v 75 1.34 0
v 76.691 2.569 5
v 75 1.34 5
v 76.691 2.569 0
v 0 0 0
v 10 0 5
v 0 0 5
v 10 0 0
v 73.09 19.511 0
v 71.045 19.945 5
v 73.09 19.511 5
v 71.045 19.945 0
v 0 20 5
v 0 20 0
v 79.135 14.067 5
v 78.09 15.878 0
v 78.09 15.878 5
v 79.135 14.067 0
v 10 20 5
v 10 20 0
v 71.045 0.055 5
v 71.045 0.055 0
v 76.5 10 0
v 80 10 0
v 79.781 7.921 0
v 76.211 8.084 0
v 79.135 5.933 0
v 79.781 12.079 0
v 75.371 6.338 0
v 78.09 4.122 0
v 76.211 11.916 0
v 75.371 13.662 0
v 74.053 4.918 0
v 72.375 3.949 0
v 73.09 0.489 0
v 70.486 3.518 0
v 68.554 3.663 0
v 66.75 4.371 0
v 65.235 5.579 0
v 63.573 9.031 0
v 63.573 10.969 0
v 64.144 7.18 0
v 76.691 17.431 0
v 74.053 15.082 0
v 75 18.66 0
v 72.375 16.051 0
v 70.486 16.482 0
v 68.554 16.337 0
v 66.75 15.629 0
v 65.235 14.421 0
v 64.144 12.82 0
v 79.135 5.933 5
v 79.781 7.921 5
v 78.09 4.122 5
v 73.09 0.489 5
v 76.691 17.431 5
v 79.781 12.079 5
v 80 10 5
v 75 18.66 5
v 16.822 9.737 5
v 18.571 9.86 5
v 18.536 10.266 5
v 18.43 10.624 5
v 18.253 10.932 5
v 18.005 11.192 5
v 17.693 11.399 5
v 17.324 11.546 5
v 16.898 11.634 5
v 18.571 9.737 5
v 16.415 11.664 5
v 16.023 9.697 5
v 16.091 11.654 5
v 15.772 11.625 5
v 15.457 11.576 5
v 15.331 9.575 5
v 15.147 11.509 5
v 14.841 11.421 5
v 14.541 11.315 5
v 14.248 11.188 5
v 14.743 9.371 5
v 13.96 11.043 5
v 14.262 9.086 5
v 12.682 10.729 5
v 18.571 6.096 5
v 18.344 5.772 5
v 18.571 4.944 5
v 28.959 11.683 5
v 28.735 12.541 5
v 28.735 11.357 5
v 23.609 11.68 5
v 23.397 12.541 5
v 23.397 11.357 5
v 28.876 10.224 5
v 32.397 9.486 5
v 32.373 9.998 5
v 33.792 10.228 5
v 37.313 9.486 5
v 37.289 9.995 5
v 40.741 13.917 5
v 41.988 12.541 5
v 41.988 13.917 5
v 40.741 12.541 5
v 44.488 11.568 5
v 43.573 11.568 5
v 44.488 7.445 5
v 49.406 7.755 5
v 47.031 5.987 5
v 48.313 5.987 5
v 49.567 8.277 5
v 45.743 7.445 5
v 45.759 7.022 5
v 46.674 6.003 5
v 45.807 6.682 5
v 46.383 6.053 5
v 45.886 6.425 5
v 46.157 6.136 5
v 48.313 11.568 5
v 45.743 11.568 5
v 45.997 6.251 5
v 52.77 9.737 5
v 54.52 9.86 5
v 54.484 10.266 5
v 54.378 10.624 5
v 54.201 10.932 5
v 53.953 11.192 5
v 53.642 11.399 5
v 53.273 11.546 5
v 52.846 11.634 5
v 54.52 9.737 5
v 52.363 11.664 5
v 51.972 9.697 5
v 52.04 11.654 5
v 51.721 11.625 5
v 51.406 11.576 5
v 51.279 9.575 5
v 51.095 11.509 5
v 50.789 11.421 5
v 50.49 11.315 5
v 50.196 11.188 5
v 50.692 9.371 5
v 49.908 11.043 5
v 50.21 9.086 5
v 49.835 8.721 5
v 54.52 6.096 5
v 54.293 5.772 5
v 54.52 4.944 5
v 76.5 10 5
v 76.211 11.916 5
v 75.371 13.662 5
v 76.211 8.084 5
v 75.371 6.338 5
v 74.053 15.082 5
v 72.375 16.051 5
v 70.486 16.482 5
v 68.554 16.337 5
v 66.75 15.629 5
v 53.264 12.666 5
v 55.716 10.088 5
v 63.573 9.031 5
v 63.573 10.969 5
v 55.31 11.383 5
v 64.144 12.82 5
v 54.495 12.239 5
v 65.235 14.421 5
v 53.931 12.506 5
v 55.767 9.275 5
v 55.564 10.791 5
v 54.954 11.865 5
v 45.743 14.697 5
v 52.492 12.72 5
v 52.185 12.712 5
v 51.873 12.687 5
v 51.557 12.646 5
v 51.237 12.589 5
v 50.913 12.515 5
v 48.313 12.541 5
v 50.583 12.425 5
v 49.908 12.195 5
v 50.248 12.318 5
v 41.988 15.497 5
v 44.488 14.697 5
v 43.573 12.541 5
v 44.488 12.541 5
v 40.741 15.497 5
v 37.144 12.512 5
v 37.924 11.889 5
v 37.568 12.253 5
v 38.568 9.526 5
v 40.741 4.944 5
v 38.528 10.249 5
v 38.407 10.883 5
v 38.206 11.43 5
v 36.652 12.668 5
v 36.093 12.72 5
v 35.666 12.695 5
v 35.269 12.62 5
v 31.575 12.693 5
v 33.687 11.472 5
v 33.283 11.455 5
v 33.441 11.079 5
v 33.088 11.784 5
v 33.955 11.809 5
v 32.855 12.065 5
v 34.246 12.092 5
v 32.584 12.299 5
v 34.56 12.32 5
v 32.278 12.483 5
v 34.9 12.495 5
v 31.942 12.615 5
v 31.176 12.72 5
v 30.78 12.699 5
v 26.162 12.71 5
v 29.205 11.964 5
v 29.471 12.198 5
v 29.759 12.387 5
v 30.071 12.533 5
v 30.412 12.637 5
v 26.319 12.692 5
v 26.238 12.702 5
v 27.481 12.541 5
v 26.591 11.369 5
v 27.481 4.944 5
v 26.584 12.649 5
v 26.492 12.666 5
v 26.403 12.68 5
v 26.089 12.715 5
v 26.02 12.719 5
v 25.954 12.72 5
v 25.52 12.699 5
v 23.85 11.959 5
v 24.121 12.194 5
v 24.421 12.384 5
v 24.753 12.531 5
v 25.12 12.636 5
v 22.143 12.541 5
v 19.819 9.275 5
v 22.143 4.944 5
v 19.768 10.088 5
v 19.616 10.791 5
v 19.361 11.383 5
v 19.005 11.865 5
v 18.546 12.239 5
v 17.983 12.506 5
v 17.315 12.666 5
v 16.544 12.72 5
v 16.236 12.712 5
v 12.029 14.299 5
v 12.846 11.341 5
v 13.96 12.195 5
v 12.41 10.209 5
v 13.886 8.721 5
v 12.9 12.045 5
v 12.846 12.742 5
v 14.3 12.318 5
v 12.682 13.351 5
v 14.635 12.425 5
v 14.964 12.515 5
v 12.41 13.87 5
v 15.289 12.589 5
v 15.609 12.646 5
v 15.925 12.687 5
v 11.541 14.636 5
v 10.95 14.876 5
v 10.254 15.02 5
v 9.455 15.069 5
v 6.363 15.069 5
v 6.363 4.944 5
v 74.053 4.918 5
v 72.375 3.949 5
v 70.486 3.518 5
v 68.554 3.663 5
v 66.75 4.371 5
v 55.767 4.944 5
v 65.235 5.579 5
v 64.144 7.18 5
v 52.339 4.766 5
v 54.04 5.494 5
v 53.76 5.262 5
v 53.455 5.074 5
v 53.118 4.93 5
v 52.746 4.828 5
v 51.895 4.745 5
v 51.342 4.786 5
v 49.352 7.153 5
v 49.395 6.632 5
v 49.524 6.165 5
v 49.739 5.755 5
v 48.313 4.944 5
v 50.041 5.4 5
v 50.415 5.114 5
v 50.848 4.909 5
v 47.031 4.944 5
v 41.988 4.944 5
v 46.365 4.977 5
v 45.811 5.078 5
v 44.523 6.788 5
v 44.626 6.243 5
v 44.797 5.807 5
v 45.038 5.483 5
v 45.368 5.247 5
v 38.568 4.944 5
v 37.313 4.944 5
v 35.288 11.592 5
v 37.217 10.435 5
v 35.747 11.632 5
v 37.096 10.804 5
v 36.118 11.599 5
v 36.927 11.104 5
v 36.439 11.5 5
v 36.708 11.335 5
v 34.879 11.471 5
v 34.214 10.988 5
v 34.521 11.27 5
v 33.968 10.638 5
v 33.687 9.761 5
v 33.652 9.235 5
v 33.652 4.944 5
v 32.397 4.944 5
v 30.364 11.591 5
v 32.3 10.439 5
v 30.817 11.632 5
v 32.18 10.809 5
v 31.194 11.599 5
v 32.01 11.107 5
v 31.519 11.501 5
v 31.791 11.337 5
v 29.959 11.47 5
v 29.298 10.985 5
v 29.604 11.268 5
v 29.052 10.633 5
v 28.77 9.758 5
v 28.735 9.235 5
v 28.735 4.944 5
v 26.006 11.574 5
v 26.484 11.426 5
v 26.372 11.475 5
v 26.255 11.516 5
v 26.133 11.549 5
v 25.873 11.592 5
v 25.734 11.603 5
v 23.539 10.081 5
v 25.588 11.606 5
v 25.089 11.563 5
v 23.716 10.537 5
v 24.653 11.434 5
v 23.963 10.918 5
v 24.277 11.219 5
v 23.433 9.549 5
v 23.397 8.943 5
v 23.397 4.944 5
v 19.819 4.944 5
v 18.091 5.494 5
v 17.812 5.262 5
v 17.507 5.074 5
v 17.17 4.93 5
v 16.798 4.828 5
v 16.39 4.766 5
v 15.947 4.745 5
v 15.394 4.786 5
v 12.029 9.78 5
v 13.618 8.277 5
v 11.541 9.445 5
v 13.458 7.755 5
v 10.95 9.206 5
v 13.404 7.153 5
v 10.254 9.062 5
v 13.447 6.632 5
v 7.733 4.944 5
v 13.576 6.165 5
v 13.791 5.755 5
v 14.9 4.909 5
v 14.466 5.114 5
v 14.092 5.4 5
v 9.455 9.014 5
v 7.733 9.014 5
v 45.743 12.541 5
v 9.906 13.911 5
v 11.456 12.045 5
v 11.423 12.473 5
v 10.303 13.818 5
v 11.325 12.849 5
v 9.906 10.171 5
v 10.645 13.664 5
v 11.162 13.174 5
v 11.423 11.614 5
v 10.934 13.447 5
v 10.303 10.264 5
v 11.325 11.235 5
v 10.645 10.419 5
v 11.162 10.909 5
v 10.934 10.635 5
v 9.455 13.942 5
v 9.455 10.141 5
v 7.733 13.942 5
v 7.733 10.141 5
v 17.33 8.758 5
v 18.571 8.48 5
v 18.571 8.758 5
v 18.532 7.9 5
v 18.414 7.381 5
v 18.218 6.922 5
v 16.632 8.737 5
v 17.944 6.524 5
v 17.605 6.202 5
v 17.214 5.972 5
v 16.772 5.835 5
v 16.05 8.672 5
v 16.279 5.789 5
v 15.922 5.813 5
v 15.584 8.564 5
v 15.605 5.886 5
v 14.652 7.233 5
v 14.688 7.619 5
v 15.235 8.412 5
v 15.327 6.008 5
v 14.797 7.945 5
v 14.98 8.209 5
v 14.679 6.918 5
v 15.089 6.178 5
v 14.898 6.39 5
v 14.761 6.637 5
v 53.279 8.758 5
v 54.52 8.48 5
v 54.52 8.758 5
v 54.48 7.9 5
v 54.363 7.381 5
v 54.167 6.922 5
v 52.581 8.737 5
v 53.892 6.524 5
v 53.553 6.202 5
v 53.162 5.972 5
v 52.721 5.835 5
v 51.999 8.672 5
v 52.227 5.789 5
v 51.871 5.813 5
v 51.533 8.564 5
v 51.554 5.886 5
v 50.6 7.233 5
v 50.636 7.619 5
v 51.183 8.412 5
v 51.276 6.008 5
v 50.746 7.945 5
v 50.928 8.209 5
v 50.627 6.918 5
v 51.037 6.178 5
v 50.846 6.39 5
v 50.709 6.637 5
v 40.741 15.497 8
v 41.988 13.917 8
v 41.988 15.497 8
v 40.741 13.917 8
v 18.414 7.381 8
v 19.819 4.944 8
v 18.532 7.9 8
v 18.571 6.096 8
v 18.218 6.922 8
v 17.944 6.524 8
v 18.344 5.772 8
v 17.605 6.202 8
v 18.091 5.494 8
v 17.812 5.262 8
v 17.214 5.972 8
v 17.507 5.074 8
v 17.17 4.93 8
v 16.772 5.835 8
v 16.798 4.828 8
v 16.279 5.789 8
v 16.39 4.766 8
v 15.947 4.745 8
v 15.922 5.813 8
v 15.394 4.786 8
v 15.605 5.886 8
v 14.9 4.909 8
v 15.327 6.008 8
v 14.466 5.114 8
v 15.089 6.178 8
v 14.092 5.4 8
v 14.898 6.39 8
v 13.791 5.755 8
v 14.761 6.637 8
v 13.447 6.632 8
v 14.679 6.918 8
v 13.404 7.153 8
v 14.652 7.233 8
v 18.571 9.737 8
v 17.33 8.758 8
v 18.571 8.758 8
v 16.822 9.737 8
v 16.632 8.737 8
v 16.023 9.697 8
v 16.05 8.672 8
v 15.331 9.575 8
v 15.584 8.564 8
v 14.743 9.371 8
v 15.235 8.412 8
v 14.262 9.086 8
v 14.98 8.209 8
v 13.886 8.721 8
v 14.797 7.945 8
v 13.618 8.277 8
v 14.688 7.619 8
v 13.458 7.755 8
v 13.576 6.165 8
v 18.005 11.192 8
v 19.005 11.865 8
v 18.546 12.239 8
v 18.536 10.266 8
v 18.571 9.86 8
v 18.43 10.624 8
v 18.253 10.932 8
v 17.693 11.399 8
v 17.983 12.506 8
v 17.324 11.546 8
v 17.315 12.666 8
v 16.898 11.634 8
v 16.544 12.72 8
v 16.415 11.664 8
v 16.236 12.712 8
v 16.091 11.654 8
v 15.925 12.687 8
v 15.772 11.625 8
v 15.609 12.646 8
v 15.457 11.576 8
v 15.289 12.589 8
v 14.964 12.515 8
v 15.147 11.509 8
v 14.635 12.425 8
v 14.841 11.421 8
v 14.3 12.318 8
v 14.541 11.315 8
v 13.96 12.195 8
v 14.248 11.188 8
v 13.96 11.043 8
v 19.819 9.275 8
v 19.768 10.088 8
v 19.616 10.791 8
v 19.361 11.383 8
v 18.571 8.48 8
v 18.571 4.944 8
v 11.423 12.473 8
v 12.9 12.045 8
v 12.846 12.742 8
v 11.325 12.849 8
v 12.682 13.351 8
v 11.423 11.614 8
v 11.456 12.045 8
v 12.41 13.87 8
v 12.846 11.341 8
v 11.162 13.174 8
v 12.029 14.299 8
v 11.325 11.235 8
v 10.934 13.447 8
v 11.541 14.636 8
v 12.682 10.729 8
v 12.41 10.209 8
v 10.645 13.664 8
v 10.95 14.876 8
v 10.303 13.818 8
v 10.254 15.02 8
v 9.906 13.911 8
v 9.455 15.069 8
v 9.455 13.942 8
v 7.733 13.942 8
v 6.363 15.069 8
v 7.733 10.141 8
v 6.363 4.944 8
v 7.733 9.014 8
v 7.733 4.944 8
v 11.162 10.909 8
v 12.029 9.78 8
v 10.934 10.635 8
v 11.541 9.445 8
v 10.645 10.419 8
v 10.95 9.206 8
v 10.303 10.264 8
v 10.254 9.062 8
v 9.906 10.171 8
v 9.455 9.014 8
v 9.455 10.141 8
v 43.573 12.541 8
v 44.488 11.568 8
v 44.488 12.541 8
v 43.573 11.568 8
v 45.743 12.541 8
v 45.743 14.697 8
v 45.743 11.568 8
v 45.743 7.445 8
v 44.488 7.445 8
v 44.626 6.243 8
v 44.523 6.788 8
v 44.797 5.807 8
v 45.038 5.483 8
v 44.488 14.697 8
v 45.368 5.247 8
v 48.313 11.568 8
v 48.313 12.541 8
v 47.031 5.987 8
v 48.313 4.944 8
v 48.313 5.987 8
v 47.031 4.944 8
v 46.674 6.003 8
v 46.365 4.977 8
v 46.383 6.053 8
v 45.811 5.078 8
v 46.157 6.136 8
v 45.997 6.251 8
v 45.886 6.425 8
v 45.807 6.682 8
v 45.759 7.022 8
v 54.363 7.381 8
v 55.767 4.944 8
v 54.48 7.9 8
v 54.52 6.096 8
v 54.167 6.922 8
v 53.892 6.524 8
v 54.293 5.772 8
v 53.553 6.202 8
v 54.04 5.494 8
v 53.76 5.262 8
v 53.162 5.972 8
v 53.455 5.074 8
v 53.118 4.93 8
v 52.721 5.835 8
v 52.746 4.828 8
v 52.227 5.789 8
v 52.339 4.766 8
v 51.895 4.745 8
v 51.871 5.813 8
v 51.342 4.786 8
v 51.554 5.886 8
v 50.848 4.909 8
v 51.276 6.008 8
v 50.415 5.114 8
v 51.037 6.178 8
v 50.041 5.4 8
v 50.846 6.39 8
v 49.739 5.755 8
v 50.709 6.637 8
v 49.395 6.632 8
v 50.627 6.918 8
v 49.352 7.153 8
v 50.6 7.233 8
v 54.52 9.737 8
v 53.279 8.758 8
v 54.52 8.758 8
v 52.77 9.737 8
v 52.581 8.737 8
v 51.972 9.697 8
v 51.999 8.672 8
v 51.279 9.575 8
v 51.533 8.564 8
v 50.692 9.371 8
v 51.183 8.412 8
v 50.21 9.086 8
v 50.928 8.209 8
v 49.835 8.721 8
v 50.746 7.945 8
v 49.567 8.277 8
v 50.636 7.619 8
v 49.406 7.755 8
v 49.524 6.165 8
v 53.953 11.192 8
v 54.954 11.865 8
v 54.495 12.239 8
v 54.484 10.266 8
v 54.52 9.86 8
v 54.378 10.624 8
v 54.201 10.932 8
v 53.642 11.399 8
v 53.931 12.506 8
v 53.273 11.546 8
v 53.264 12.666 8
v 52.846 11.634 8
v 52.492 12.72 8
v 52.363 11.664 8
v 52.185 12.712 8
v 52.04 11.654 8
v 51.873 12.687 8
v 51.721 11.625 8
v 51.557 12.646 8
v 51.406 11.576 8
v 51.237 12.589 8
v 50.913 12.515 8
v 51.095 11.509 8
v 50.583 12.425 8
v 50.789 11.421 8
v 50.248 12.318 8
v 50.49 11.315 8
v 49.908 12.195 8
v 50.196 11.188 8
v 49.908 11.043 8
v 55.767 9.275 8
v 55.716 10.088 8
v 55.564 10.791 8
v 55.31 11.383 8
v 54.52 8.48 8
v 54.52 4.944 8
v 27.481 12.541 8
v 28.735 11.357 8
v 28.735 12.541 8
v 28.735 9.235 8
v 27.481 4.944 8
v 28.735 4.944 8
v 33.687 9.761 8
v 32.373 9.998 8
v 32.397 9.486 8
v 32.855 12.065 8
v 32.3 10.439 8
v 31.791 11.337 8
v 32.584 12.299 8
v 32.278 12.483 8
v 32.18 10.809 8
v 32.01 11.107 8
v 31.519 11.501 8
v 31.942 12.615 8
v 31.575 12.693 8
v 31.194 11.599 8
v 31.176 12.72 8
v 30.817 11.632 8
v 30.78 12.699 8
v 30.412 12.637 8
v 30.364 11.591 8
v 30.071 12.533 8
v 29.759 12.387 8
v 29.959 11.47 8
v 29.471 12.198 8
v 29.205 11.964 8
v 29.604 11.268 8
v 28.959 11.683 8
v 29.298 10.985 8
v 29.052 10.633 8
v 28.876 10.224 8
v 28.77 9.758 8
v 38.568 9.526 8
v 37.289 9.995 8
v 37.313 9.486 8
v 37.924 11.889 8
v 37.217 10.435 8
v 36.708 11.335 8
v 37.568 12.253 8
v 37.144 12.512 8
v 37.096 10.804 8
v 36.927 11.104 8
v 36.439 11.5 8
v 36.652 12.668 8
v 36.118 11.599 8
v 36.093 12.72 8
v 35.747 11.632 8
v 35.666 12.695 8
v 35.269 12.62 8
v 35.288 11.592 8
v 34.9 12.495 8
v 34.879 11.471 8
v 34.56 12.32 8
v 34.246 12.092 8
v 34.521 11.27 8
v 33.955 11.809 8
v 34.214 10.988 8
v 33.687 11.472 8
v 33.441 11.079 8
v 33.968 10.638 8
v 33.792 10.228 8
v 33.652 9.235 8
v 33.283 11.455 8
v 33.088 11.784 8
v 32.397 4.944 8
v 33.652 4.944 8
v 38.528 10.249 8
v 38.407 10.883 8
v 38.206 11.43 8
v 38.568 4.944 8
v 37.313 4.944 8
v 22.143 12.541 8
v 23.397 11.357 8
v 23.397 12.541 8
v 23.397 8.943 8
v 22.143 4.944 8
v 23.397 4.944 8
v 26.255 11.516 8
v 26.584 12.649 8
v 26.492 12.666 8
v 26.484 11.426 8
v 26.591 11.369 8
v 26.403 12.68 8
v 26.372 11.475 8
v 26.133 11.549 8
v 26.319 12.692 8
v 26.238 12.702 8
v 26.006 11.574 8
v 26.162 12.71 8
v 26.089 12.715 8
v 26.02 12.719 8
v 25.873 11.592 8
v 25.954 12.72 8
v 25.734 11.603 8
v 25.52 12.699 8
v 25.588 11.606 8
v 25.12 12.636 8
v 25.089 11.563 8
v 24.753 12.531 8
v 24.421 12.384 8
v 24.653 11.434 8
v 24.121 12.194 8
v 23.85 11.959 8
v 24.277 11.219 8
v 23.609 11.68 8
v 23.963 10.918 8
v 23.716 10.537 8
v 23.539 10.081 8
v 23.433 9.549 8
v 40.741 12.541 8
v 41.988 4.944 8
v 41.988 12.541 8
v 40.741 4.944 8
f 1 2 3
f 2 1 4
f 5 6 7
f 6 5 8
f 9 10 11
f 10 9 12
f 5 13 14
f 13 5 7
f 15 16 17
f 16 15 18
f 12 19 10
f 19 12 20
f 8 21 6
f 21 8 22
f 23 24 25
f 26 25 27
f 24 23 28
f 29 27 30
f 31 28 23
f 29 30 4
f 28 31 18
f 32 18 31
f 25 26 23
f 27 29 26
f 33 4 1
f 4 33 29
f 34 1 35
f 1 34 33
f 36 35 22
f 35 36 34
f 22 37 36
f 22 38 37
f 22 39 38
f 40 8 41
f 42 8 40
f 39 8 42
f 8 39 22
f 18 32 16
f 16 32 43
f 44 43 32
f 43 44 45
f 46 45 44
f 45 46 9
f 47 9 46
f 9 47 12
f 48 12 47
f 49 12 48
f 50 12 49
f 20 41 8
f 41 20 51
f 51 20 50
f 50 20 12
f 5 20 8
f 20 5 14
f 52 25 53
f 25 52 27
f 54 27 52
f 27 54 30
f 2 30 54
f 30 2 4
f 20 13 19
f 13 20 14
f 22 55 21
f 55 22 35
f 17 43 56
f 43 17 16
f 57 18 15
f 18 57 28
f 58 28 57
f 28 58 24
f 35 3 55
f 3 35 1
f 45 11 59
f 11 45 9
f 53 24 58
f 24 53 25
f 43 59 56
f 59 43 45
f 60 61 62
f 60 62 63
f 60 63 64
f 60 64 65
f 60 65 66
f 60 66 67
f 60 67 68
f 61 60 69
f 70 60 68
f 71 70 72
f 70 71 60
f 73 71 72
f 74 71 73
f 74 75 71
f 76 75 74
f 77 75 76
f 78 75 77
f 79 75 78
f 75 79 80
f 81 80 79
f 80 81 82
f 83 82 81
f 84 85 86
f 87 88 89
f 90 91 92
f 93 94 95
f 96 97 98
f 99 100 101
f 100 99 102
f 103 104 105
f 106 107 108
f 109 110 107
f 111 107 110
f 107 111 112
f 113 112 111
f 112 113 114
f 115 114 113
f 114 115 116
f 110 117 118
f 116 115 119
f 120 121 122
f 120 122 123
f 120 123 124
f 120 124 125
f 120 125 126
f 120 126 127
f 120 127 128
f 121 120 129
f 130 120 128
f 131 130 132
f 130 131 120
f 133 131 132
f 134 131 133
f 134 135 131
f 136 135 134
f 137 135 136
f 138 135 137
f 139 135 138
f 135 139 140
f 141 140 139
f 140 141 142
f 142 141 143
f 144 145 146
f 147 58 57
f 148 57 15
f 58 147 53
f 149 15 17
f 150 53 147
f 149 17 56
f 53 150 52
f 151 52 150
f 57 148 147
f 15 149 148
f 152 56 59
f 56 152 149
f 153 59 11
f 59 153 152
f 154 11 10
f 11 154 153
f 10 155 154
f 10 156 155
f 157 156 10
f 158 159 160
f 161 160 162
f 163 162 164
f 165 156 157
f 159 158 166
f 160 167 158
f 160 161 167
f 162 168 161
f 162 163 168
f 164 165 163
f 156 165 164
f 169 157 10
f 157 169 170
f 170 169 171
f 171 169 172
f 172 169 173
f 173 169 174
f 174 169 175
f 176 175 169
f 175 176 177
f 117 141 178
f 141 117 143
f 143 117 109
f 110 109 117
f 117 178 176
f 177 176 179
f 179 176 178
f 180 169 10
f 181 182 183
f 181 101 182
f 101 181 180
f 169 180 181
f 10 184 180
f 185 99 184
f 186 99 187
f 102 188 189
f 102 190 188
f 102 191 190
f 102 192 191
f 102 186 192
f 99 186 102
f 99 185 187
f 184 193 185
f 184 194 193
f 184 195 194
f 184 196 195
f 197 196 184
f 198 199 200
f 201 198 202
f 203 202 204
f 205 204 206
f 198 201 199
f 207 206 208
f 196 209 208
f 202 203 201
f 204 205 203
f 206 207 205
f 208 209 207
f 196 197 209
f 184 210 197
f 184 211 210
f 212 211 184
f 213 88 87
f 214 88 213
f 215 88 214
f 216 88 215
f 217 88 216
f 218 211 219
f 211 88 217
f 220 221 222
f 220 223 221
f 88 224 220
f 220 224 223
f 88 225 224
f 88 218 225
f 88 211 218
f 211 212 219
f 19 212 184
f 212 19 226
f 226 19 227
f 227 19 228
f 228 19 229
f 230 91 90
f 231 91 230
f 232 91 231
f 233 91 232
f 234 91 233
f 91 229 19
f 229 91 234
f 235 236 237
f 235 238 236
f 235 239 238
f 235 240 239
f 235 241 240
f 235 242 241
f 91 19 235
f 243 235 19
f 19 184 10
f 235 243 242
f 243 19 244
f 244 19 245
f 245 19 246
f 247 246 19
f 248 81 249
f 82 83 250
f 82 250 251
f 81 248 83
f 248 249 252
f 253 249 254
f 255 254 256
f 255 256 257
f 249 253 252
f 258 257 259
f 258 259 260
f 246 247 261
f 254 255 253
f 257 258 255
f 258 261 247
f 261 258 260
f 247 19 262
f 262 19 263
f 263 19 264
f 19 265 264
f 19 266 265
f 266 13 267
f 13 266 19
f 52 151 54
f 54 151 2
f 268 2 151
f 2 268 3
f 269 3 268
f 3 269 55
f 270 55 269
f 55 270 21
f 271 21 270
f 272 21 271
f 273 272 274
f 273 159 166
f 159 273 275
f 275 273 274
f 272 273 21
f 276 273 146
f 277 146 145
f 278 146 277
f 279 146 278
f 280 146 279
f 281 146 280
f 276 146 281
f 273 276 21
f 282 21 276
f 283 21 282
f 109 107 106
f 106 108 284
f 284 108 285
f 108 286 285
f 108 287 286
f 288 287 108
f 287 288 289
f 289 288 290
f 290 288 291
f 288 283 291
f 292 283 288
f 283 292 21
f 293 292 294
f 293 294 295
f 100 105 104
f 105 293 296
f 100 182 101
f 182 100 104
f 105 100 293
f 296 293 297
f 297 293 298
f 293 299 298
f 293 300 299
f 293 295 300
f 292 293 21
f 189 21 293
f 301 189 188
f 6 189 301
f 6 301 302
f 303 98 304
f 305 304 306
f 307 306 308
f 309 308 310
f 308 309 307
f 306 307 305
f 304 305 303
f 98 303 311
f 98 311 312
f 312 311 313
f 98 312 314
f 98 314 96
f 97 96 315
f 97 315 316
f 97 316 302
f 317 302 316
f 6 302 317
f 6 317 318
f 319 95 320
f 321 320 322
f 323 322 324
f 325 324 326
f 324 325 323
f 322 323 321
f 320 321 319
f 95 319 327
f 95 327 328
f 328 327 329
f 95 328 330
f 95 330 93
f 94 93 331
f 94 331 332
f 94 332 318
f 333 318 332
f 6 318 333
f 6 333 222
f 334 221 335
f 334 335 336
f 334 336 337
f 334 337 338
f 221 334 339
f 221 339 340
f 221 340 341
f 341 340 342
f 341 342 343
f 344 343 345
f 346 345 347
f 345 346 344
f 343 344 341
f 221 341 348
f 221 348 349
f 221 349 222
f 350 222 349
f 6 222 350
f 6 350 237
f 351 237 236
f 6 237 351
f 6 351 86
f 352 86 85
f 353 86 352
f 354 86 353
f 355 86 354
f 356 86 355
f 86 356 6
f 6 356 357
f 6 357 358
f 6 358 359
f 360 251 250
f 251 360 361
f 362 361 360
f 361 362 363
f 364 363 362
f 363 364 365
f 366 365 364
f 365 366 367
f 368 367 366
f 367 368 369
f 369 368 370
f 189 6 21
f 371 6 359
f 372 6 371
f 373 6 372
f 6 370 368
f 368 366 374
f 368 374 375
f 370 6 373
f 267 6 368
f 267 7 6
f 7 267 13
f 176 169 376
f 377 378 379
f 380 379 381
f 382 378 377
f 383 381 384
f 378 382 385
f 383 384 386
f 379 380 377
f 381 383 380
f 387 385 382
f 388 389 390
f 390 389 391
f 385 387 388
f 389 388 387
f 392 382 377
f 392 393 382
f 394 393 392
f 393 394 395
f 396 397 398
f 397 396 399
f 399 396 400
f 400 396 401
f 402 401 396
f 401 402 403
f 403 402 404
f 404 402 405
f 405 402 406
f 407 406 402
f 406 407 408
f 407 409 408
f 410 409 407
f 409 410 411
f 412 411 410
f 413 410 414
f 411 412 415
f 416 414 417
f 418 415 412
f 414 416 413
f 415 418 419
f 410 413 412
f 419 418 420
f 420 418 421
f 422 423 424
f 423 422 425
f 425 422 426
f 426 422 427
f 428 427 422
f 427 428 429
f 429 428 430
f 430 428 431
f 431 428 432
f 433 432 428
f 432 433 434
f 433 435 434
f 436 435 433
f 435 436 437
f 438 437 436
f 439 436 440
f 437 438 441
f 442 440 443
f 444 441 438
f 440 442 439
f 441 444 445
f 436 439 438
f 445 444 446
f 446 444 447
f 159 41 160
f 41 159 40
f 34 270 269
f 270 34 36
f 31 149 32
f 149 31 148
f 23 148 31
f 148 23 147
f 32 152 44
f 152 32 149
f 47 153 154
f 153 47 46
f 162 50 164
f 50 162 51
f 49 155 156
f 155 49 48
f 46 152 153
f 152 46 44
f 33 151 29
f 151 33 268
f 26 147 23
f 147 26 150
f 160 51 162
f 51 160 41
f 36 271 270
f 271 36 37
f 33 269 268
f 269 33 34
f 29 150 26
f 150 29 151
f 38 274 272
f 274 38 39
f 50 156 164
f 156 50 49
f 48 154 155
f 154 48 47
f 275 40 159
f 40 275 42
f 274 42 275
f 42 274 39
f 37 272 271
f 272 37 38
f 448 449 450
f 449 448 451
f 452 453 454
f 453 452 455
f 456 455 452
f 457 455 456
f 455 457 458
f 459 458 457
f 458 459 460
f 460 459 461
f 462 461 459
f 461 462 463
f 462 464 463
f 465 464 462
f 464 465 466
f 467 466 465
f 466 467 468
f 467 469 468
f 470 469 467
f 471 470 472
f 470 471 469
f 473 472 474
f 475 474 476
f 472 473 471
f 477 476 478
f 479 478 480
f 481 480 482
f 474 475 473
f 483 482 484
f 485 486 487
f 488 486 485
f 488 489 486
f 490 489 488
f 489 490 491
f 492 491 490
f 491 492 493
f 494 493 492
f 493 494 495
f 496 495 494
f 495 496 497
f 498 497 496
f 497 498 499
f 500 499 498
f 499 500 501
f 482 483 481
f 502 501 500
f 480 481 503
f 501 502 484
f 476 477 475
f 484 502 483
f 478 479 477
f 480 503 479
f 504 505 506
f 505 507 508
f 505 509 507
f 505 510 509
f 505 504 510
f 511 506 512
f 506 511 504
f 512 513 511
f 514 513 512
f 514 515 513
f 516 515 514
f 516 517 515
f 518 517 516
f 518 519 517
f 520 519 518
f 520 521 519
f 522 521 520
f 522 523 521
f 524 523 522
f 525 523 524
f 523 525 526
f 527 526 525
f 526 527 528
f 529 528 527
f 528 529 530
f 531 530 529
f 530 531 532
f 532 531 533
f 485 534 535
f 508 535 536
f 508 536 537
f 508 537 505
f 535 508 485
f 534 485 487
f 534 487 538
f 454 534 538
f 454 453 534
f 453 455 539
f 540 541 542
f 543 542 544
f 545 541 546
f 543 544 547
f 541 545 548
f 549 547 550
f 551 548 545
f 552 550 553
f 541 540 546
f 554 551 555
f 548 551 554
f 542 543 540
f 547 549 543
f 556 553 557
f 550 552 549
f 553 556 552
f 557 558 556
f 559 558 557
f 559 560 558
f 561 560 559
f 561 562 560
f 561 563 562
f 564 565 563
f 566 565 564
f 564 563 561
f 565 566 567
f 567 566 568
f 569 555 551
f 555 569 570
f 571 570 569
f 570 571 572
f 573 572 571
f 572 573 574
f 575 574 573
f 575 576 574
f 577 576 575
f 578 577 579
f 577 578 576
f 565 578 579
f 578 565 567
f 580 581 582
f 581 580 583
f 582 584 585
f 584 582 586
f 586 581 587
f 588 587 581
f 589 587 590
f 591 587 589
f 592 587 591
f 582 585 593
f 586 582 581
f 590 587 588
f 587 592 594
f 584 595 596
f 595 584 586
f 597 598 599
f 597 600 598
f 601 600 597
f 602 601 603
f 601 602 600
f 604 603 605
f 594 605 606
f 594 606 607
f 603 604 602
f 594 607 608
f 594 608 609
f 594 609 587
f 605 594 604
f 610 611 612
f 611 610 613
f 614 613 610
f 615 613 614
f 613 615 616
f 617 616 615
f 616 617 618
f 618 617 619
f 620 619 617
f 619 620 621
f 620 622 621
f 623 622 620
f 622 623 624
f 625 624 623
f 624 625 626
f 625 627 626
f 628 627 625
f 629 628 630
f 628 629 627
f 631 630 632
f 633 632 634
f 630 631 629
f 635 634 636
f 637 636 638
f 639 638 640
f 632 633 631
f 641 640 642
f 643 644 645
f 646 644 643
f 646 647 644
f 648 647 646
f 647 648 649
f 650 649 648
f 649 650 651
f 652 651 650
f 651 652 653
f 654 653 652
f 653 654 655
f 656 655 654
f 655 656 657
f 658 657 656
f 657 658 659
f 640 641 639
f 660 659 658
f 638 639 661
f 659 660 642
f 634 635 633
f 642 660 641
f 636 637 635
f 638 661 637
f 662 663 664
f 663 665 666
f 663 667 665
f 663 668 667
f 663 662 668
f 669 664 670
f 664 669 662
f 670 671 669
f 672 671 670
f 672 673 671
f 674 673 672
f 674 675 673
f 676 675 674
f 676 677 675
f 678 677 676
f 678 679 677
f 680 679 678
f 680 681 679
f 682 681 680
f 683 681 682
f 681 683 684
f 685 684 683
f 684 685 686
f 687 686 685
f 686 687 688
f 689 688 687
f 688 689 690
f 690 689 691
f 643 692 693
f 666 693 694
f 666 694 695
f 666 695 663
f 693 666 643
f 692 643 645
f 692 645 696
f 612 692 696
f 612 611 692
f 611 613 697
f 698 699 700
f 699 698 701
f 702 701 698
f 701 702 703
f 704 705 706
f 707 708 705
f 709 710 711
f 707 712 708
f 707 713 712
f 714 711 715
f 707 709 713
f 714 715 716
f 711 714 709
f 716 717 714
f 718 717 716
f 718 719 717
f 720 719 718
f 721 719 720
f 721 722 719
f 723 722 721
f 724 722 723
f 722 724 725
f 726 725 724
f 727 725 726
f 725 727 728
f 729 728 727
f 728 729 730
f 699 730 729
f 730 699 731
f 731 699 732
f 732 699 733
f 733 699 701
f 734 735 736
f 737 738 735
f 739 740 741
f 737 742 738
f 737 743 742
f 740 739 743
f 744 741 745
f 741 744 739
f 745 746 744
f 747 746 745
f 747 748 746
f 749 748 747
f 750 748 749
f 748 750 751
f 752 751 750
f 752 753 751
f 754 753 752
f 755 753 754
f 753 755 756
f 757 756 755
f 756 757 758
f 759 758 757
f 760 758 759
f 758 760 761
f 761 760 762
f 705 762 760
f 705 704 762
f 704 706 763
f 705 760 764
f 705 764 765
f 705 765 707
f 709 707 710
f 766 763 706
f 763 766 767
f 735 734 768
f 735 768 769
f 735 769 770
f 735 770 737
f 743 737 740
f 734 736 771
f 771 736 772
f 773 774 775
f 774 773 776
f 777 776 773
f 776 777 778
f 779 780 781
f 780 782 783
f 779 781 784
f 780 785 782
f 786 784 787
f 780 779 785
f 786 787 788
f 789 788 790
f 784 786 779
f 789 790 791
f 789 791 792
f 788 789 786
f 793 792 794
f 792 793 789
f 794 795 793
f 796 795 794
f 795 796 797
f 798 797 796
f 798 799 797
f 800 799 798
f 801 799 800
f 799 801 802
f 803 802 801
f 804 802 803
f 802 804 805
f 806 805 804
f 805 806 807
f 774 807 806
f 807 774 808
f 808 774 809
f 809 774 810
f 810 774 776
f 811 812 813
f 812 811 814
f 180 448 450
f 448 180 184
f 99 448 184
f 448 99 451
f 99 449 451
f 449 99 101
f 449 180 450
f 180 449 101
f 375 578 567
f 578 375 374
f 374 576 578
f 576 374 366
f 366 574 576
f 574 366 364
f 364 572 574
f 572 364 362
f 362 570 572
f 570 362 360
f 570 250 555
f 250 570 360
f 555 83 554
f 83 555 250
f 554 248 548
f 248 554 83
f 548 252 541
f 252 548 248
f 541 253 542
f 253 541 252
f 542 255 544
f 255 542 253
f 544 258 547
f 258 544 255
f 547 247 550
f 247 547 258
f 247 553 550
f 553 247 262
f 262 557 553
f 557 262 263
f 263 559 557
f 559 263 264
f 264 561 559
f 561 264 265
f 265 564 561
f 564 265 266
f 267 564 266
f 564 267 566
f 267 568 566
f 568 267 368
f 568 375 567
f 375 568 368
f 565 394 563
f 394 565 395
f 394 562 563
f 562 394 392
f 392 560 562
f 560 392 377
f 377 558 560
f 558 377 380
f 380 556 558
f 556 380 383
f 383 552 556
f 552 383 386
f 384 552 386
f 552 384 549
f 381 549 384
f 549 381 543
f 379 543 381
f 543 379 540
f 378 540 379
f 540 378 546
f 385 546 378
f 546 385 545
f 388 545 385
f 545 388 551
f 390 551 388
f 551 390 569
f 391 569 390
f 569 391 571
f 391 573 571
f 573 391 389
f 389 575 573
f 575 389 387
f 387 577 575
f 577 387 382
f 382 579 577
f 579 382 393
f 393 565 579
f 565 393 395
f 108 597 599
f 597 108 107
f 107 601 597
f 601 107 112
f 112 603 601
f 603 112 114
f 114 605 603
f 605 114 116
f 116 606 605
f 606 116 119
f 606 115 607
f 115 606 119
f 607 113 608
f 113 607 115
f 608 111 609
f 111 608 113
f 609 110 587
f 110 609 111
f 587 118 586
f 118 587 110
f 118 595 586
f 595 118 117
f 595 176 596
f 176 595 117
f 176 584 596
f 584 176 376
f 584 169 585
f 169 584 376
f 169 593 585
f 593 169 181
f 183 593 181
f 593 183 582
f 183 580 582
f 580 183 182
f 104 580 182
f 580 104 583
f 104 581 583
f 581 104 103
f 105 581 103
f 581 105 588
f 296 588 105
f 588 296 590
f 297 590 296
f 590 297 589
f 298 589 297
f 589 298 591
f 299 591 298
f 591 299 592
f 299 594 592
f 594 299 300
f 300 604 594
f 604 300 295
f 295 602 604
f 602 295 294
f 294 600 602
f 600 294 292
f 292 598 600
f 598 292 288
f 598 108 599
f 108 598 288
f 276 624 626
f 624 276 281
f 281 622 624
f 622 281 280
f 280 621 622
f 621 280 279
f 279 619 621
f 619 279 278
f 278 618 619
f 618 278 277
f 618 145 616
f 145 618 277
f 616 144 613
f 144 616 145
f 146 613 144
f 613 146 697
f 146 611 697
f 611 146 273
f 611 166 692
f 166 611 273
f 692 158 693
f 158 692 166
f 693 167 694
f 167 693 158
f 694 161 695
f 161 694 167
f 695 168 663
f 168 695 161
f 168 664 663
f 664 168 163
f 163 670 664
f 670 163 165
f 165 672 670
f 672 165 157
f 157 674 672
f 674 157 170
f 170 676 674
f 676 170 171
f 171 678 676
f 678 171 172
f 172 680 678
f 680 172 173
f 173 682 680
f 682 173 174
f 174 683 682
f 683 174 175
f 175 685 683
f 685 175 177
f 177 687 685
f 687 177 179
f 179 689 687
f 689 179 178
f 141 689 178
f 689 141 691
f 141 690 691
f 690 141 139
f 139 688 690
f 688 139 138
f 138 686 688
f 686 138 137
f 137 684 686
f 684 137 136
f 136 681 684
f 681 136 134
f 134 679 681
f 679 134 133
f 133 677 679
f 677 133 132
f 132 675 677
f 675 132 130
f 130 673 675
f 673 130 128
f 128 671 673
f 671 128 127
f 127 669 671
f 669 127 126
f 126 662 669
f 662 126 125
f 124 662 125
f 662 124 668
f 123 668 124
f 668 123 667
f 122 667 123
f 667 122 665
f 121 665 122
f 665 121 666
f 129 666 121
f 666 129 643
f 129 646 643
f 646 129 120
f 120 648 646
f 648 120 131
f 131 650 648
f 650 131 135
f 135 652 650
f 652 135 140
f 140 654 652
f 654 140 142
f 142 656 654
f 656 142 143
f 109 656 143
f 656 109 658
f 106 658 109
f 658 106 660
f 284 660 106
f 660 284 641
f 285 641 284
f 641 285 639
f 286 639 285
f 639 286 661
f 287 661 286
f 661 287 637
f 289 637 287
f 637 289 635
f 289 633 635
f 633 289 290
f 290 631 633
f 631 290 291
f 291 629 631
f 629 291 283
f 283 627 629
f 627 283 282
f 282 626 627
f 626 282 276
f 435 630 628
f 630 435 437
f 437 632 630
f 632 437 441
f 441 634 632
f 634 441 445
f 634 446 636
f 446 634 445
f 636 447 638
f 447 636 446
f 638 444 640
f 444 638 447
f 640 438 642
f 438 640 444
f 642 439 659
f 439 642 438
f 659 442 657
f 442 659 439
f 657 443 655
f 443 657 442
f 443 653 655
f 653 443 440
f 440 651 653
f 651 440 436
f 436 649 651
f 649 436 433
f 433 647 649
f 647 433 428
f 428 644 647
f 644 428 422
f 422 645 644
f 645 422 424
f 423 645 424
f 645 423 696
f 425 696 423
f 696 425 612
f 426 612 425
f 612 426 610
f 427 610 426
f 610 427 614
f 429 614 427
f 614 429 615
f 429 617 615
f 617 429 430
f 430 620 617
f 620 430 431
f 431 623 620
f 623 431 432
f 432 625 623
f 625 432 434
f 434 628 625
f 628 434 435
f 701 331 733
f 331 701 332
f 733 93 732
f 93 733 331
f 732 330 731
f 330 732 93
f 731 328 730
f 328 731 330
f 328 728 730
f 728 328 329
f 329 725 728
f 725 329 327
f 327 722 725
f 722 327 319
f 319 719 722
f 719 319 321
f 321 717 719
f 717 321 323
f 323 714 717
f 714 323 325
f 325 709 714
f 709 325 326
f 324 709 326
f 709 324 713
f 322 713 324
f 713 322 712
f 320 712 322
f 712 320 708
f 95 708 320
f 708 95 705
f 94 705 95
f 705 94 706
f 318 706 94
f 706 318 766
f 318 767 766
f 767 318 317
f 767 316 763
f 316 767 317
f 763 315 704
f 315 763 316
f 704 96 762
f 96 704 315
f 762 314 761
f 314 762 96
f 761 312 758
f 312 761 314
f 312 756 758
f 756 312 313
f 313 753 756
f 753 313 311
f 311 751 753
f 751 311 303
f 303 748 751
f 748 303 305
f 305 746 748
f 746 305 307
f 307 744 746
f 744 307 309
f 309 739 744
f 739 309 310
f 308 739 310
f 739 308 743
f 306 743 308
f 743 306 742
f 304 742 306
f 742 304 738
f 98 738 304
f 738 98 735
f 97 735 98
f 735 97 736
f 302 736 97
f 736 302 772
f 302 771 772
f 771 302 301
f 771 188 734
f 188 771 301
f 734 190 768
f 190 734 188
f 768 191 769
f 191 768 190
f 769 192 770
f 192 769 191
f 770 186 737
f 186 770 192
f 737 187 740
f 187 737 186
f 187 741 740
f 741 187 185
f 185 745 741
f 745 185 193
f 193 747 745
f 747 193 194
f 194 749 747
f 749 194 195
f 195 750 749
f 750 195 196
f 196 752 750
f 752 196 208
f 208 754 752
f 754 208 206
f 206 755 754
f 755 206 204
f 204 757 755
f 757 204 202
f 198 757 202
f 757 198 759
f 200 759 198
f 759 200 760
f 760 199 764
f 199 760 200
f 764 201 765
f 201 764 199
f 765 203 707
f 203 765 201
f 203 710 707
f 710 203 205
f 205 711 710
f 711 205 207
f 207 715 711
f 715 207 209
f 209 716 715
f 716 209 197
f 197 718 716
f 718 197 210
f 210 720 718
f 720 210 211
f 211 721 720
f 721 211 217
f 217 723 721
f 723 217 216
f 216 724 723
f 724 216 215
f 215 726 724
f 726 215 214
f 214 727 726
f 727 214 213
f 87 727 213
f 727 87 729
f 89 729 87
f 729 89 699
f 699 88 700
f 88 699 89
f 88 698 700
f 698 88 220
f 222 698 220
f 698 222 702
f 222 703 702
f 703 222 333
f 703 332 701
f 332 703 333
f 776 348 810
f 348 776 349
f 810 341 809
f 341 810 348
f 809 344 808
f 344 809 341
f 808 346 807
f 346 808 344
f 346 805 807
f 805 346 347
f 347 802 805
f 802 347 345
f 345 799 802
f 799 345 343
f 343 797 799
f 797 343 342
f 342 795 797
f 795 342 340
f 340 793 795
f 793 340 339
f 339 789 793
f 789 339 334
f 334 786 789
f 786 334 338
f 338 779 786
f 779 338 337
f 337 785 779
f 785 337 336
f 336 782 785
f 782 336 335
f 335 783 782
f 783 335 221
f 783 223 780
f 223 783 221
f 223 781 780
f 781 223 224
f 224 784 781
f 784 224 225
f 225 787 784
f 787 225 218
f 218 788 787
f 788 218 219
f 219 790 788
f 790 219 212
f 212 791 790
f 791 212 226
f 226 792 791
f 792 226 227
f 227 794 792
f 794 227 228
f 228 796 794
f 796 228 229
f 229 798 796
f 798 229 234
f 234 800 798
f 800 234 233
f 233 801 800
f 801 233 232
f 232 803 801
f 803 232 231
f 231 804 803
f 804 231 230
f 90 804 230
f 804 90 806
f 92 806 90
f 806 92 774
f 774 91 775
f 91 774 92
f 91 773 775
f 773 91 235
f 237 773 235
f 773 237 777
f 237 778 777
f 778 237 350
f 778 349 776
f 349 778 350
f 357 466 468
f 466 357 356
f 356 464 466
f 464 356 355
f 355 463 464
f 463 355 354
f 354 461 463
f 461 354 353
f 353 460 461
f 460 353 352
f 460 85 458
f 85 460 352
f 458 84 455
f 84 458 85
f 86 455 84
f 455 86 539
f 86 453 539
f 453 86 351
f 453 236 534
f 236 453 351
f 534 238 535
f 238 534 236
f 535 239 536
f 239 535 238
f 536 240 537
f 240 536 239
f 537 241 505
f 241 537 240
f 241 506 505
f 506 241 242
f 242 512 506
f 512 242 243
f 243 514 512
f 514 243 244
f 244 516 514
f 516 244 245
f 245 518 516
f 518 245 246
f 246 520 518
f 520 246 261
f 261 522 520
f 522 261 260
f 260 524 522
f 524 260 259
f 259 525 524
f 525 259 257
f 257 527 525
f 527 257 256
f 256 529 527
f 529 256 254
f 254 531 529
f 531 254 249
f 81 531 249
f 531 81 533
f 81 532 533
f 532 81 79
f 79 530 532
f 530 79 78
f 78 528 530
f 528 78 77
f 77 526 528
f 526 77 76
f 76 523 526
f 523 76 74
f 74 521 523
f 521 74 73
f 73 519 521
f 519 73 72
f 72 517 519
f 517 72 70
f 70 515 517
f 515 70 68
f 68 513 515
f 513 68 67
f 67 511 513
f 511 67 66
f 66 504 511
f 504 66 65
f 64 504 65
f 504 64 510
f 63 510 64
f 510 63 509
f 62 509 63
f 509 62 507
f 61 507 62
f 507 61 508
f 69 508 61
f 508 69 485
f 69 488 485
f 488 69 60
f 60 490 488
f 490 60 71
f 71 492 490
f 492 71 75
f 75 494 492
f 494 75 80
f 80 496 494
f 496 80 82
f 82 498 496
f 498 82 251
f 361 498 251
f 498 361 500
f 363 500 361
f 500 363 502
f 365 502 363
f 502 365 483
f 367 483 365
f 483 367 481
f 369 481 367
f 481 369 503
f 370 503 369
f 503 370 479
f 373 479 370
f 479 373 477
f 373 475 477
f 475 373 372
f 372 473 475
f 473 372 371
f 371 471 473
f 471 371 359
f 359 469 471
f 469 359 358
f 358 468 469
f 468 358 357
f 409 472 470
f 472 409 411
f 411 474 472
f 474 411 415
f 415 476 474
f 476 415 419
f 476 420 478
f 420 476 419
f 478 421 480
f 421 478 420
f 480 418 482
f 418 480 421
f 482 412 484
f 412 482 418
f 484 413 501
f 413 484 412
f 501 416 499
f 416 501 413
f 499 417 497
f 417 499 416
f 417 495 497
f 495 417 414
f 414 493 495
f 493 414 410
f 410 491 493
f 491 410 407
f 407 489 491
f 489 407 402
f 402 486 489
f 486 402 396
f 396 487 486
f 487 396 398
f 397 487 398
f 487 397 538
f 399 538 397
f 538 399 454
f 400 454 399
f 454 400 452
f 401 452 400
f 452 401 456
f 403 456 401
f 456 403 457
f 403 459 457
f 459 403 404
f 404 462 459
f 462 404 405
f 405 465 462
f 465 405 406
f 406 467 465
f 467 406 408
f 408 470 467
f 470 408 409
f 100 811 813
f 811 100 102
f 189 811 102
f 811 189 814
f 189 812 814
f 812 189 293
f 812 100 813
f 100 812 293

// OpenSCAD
width = 20;
thickness = 5;

difference()
{
    // #1 : thing that shows up
    hull()
    {
        cube([ 10, width, thickness]);
        translate([ 70, width/2, 0])
        cylinder( d = width, h = thickness);    
    }
    // #2: thing that doesn't show up, 
          //slices away 
    translate([ 70, width/2, 0])
    cylinder( d = width/2 + 3, h = thickness); 
}



linear_extrude(thickness + 3)
translate([5, width/2, 0])
text("Parmita", valign = "center", font = "Avenir Next:style=Regular");
